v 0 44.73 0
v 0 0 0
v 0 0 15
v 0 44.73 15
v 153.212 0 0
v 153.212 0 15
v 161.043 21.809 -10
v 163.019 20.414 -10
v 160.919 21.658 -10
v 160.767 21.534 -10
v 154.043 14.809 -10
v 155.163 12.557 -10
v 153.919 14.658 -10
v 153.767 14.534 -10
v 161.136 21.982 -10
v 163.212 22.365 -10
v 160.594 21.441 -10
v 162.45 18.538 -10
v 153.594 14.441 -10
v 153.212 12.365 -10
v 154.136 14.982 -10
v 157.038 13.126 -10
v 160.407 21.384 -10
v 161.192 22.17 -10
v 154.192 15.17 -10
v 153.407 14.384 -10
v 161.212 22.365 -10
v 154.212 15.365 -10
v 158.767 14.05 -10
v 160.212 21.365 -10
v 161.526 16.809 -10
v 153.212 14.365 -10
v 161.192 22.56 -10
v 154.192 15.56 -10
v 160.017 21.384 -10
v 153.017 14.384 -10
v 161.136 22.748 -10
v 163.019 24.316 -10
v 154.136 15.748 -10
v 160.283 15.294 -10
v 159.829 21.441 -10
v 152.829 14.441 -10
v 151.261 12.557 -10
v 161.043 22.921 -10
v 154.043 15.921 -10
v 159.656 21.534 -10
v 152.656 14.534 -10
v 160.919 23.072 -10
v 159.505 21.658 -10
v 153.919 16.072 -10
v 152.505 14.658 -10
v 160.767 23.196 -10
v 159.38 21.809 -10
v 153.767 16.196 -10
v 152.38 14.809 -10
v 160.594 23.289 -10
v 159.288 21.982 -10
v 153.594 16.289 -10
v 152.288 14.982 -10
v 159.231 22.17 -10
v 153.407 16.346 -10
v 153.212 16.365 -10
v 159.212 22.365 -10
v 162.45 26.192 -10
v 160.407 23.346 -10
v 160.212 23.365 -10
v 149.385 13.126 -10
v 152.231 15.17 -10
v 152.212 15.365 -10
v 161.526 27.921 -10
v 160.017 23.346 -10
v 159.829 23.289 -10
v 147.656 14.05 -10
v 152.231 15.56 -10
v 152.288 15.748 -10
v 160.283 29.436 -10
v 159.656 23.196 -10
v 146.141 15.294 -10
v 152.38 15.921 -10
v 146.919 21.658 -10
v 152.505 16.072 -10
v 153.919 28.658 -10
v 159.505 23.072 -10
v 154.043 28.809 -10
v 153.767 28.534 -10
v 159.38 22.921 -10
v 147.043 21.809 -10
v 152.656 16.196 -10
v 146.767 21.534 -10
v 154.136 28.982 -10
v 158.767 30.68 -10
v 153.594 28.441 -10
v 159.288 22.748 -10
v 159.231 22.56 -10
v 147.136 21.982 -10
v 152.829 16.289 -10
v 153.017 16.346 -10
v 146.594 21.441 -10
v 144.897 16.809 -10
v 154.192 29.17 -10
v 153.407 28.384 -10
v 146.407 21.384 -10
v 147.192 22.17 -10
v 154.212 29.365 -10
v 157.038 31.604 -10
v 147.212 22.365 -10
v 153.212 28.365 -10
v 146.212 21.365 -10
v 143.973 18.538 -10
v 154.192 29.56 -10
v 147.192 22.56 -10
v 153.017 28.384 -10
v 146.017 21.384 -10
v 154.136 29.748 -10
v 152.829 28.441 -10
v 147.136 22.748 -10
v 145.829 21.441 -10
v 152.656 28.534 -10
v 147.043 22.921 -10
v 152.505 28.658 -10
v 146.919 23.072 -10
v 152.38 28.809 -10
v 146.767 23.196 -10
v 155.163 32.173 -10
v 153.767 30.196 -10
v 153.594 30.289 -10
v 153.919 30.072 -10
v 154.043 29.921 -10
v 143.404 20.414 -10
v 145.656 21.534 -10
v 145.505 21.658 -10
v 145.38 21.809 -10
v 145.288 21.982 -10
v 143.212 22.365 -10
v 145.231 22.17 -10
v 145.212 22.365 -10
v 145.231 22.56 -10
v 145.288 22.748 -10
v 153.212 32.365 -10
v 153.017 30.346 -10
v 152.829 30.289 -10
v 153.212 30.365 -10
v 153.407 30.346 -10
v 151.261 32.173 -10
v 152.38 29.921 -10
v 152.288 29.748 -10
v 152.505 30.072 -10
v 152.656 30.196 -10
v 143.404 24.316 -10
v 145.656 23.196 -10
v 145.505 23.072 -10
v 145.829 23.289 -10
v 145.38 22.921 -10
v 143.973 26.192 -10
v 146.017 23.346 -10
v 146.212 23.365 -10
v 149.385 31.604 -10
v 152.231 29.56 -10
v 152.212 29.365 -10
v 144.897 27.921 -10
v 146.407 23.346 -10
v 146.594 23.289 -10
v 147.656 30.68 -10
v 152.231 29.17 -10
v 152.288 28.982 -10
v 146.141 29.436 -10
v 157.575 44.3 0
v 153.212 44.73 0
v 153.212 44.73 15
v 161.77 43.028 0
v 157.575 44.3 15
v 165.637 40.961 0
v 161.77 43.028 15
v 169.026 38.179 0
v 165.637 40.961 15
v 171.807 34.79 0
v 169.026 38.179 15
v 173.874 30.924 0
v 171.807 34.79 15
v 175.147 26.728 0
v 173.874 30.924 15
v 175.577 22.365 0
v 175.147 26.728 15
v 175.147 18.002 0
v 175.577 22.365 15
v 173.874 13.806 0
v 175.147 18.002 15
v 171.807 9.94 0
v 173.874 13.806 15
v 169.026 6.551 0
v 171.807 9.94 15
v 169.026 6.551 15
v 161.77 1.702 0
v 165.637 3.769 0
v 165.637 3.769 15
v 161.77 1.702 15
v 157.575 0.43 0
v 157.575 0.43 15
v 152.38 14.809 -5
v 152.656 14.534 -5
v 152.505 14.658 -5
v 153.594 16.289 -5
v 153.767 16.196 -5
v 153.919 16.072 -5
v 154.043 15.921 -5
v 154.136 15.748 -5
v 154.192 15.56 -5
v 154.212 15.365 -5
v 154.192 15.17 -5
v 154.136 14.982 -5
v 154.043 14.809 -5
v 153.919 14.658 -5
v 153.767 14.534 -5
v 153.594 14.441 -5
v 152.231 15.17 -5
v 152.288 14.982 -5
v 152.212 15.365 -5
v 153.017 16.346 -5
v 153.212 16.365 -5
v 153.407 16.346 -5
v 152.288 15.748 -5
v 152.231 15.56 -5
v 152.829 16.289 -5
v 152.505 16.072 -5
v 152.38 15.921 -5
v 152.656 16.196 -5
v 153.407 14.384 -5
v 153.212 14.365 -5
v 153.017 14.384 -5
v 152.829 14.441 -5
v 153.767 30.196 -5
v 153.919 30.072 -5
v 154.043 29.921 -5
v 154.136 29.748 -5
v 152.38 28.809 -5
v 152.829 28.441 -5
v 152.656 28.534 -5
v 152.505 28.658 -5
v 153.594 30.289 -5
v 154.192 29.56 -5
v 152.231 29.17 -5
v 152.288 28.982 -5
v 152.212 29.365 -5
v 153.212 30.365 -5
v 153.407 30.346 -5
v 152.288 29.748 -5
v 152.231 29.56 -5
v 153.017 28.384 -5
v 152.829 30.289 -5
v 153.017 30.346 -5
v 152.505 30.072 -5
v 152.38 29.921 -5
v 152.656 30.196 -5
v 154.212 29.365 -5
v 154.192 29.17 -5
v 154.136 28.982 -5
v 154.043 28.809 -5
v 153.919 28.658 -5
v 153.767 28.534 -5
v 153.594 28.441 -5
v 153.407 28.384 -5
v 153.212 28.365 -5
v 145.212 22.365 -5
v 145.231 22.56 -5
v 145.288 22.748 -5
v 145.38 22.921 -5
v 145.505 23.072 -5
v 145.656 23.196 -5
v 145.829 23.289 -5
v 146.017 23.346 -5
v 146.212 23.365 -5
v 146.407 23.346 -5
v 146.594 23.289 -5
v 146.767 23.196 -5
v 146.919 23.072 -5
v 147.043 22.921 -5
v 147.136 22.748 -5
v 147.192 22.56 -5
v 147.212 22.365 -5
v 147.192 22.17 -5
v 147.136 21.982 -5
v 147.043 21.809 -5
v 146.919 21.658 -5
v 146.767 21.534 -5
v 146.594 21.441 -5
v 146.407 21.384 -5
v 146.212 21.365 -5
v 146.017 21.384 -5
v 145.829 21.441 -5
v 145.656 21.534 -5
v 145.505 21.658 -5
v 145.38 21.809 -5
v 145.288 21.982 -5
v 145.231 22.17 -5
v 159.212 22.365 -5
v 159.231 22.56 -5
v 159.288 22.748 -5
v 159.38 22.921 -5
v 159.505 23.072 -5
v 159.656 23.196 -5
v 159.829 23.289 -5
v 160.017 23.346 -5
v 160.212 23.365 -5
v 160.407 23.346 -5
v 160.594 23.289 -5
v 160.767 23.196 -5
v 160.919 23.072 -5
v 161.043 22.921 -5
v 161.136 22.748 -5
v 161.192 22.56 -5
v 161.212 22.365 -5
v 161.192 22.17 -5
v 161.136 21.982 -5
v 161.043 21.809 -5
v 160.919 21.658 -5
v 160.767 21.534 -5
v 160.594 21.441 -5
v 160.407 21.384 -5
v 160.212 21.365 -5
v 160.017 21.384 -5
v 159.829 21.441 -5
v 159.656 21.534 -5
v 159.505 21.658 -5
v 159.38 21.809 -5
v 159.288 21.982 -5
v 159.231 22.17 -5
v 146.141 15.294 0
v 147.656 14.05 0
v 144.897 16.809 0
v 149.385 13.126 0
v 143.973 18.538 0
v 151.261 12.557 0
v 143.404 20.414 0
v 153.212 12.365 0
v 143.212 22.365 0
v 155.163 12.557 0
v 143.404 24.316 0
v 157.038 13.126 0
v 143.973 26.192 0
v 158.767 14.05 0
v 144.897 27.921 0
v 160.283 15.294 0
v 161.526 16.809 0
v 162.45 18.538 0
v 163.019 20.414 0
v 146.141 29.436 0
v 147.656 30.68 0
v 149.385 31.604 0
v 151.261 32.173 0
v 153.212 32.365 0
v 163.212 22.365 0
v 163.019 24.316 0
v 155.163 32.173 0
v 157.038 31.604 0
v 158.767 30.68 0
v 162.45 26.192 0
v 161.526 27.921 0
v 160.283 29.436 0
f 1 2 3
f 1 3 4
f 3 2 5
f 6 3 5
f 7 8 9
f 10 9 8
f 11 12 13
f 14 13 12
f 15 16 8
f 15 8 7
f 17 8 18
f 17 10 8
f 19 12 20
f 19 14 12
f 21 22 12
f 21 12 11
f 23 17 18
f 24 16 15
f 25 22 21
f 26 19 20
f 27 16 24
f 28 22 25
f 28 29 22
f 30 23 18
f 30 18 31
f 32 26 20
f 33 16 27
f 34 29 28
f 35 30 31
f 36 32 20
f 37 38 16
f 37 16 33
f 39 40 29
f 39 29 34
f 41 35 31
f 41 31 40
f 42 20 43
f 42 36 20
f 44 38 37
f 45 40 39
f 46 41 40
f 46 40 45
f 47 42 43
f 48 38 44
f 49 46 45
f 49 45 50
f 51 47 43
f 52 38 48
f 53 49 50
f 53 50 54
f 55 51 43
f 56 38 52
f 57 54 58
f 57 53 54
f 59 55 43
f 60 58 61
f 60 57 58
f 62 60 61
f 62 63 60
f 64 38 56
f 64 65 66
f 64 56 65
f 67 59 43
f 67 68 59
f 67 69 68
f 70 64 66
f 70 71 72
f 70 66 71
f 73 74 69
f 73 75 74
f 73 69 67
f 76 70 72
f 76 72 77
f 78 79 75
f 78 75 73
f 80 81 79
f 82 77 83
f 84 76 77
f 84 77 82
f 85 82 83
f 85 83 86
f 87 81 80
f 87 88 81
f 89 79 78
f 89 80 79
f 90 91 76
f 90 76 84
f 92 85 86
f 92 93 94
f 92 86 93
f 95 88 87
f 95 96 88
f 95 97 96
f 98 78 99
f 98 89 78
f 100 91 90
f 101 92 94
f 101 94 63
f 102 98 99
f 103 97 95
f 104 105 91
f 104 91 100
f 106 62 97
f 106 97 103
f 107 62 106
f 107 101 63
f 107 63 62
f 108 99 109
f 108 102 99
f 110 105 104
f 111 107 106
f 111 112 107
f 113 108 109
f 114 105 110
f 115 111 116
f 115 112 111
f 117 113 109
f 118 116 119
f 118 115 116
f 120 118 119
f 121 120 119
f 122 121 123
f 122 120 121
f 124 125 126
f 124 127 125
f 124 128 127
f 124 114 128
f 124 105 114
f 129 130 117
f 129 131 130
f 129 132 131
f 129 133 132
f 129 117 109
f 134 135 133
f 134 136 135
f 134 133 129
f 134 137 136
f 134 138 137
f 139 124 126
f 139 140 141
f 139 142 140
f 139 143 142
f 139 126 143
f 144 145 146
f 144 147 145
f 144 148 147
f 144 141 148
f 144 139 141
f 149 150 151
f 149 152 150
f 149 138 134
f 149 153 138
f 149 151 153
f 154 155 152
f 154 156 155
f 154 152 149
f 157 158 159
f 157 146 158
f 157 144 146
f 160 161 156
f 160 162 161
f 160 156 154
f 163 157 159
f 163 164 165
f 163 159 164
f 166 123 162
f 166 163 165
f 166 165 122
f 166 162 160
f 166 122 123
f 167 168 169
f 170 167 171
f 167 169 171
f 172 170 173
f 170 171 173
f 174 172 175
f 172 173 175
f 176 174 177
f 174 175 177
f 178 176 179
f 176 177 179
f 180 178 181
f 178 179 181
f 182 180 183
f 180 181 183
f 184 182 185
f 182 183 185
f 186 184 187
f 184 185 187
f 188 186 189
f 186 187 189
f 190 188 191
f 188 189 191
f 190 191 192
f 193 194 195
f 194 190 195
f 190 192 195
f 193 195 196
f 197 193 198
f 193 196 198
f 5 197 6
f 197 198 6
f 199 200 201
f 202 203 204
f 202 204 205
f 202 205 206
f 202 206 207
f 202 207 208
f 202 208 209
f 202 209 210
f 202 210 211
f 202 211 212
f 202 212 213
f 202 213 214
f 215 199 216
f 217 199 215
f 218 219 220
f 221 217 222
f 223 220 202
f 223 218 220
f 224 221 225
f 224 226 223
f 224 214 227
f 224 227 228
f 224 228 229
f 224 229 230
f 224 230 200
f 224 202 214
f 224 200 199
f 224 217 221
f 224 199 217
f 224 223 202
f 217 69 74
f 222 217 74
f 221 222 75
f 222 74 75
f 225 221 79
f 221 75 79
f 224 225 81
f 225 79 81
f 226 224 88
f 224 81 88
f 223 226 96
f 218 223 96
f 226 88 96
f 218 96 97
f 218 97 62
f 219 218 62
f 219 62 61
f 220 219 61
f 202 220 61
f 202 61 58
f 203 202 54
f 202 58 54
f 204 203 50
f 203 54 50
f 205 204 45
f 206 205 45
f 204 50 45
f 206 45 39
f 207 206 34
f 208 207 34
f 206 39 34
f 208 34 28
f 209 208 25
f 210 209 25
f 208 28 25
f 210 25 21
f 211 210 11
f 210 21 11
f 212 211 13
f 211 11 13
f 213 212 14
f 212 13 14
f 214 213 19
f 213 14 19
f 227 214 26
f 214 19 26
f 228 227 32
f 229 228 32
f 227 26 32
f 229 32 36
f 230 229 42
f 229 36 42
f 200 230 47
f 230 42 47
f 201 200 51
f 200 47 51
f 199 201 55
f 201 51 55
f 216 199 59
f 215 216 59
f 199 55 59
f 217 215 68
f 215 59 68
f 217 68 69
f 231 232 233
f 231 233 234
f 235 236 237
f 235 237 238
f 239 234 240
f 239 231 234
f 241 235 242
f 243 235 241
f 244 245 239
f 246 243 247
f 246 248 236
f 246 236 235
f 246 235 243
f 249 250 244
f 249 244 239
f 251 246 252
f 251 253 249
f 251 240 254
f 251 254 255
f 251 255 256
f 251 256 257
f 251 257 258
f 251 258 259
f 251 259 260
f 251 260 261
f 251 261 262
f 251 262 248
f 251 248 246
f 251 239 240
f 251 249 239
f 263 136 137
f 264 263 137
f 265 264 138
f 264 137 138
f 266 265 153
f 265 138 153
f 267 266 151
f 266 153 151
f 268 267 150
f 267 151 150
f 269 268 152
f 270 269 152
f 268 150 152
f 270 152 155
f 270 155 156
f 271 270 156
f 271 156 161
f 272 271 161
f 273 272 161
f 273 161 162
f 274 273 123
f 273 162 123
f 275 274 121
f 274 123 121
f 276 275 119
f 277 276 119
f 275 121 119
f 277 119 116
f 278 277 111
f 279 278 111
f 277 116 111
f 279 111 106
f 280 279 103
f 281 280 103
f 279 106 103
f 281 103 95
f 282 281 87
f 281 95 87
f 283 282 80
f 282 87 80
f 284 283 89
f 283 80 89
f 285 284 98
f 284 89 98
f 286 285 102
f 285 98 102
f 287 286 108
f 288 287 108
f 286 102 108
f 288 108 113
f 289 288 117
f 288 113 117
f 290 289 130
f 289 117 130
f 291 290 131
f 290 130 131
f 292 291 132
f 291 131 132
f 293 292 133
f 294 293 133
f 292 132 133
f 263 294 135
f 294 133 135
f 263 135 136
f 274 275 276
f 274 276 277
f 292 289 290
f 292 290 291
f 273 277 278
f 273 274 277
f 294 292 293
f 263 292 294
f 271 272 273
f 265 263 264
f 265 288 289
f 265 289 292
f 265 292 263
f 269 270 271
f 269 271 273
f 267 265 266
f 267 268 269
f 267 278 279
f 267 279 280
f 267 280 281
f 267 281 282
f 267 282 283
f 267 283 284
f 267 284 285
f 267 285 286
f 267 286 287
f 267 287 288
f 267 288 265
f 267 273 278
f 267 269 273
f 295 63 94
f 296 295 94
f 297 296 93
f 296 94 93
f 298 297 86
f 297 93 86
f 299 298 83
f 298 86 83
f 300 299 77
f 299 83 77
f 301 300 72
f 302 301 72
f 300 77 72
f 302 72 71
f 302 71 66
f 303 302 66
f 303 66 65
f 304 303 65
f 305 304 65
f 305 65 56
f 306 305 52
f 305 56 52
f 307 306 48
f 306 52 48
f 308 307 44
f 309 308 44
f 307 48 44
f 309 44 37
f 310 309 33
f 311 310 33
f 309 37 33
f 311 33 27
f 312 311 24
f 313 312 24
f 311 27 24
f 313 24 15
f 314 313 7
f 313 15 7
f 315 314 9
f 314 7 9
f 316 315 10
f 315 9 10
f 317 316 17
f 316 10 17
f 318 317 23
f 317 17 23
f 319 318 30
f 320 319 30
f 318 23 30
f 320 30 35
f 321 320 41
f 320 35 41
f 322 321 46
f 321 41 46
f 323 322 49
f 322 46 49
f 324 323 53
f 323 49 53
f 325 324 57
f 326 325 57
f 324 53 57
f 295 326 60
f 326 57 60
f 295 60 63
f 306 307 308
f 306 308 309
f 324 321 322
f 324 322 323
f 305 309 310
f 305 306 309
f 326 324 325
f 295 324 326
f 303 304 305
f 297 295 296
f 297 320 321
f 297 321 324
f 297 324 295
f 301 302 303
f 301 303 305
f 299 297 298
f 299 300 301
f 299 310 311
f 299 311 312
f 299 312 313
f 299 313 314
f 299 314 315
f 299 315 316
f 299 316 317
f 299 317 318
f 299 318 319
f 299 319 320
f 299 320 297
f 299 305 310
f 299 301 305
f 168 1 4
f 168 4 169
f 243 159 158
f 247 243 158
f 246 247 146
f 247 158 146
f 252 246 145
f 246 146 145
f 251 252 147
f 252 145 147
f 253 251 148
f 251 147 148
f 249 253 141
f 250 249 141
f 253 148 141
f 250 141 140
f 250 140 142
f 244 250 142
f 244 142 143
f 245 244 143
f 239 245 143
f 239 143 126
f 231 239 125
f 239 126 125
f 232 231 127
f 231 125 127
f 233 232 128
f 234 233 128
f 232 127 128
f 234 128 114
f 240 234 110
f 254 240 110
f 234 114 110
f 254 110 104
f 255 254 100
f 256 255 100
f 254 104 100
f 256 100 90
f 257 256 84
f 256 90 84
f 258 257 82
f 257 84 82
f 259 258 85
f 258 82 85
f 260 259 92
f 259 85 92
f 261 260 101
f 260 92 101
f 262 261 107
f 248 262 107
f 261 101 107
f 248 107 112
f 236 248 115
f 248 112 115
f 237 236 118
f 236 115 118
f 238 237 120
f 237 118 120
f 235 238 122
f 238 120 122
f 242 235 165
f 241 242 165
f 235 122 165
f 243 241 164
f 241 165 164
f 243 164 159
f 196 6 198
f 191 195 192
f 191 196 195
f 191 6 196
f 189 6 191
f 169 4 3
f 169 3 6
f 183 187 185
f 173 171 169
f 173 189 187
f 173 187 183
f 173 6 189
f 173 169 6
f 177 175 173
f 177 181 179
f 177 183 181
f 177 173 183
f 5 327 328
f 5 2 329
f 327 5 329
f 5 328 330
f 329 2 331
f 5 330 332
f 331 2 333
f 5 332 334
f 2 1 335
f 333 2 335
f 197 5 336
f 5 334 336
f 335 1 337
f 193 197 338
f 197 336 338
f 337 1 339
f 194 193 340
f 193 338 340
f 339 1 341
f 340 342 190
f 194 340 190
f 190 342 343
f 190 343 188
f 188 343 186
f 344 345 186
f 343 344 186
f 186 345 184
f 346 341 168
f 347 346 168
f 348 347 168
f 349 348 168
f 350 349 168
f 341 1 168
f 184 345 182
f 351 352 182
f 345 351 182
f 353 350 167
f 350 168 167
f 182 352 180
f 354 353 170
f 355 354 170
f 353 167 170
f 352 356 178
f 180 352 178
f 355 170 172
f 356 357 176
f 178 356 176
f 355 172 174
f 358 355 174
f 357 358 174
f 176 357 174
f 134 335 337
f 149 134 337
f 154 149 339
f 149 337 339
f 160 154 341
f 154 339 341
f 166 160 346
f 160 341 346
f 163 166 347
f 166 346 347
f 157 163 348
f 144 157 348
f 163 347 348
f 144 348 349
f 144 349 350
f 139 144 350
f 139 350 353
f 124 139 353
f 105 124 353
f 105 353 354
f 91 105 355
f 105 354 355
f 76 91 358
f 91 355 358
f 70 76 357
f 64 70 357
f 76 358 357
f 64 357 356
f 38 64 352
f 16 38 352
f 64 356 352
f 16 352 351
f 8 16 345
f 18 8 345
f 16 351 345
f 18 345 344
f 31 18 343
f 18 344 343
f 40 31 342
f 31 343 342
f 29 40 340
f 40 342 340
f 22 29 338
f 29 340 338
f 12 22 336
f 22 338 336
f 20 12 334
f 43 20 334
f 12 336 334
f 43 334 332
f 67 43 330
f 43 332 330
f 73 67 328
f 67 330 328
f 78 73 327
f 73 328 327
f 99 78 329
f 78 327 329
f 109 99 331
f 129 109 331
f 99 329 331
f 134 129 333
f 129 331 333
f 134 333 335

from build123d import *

# Parameters (mm, degrees)
SKETCH_1_W          = 300
SKETCH_1_H          = 44.73
EXTRUDE_1_DEPTH     = 15
CUT_EXTRUDE_4_REACH = 305.687
SKETCH_6_R          = 10
EXTRUDE_2_DEPTH     = 10
SKETCH_7_R          = 1
CUT_EXTRUDE_6_DEPTH = 5


with BuildPart() as part:
    # 草图1 → 凸台-拉伸1 (new body)
    with BuildSketch(Plane.XY):
        with Locations((150, 22.365)):
            Rectangle(SKETCH_1_W, SKETCH_1_H)
    extrude(amount=EXTRUDE_1_DEPTH)

    # 草图4 → 切除-拉伸4 (cut, up to next)
    with BuildSketch(Plane.XY.offset(15), mode=Mode.PRIVATE) as cut_extrude_4_sk1:
        with BuildLine():
            Line((300, 44.73), (153.211623388, 44.73))
            ThreePointArc((153.211623388, 44.73), (175.576623388, 22.365), (153.211623388, 0))
            Line((153.211623388, 0), (300, 0))
            Line((300, 0), (300, 44.73))
        make_face()
    cut_extrude_4_tool1 = extrude(cut_extrude_4_sk1.sketch, amount=-CUT_EXTRUDE_4_REACH, mode=Mode.PRIVATE) & part.part
    add(cut_extrude_4_tool1.solids().sort_by_distance((235.292113, 22.365, 15))[0], mode=Mode.SUBTRACT)

    # 草图6 → 凸台-拉伸2 (add)
    with BuildSketch(Plane(origin=(0, 0, 0), x_dir=(-1, 0, 0), z_dir=(0, 0, -1))):
        with Locations((-153.211623388, 22.365)):
            Circle(SKETCH_6_R)
    extrude(amount=EXTRUDE_2_DEPTH)

    # 草图7 → 切除-拉伸6 (cut)
    with BuildSketch(Plane(origin=(0, 0, -10), x_dir=(-1, 0, 0), z_dir=(0, 0, -1))):
        with Locations((-153.211623388, 29.365)):
            Circle(SKETCH_7_R)
        with Locations((-146.211623388, 22.365)):
            Circle(SKETCH_7_R)
        with Locations((-153.211623388, 15.365)):
            Circle(SKETCH_7_R)
        with Locations((-160.211623388, 22.365)):
            Circle(SKETCH_7_R)
    extrude(amount=-CUT_EXTRUDE_6_DEPTH, mode=Mode.SUBTRACT)


solid = part.part
